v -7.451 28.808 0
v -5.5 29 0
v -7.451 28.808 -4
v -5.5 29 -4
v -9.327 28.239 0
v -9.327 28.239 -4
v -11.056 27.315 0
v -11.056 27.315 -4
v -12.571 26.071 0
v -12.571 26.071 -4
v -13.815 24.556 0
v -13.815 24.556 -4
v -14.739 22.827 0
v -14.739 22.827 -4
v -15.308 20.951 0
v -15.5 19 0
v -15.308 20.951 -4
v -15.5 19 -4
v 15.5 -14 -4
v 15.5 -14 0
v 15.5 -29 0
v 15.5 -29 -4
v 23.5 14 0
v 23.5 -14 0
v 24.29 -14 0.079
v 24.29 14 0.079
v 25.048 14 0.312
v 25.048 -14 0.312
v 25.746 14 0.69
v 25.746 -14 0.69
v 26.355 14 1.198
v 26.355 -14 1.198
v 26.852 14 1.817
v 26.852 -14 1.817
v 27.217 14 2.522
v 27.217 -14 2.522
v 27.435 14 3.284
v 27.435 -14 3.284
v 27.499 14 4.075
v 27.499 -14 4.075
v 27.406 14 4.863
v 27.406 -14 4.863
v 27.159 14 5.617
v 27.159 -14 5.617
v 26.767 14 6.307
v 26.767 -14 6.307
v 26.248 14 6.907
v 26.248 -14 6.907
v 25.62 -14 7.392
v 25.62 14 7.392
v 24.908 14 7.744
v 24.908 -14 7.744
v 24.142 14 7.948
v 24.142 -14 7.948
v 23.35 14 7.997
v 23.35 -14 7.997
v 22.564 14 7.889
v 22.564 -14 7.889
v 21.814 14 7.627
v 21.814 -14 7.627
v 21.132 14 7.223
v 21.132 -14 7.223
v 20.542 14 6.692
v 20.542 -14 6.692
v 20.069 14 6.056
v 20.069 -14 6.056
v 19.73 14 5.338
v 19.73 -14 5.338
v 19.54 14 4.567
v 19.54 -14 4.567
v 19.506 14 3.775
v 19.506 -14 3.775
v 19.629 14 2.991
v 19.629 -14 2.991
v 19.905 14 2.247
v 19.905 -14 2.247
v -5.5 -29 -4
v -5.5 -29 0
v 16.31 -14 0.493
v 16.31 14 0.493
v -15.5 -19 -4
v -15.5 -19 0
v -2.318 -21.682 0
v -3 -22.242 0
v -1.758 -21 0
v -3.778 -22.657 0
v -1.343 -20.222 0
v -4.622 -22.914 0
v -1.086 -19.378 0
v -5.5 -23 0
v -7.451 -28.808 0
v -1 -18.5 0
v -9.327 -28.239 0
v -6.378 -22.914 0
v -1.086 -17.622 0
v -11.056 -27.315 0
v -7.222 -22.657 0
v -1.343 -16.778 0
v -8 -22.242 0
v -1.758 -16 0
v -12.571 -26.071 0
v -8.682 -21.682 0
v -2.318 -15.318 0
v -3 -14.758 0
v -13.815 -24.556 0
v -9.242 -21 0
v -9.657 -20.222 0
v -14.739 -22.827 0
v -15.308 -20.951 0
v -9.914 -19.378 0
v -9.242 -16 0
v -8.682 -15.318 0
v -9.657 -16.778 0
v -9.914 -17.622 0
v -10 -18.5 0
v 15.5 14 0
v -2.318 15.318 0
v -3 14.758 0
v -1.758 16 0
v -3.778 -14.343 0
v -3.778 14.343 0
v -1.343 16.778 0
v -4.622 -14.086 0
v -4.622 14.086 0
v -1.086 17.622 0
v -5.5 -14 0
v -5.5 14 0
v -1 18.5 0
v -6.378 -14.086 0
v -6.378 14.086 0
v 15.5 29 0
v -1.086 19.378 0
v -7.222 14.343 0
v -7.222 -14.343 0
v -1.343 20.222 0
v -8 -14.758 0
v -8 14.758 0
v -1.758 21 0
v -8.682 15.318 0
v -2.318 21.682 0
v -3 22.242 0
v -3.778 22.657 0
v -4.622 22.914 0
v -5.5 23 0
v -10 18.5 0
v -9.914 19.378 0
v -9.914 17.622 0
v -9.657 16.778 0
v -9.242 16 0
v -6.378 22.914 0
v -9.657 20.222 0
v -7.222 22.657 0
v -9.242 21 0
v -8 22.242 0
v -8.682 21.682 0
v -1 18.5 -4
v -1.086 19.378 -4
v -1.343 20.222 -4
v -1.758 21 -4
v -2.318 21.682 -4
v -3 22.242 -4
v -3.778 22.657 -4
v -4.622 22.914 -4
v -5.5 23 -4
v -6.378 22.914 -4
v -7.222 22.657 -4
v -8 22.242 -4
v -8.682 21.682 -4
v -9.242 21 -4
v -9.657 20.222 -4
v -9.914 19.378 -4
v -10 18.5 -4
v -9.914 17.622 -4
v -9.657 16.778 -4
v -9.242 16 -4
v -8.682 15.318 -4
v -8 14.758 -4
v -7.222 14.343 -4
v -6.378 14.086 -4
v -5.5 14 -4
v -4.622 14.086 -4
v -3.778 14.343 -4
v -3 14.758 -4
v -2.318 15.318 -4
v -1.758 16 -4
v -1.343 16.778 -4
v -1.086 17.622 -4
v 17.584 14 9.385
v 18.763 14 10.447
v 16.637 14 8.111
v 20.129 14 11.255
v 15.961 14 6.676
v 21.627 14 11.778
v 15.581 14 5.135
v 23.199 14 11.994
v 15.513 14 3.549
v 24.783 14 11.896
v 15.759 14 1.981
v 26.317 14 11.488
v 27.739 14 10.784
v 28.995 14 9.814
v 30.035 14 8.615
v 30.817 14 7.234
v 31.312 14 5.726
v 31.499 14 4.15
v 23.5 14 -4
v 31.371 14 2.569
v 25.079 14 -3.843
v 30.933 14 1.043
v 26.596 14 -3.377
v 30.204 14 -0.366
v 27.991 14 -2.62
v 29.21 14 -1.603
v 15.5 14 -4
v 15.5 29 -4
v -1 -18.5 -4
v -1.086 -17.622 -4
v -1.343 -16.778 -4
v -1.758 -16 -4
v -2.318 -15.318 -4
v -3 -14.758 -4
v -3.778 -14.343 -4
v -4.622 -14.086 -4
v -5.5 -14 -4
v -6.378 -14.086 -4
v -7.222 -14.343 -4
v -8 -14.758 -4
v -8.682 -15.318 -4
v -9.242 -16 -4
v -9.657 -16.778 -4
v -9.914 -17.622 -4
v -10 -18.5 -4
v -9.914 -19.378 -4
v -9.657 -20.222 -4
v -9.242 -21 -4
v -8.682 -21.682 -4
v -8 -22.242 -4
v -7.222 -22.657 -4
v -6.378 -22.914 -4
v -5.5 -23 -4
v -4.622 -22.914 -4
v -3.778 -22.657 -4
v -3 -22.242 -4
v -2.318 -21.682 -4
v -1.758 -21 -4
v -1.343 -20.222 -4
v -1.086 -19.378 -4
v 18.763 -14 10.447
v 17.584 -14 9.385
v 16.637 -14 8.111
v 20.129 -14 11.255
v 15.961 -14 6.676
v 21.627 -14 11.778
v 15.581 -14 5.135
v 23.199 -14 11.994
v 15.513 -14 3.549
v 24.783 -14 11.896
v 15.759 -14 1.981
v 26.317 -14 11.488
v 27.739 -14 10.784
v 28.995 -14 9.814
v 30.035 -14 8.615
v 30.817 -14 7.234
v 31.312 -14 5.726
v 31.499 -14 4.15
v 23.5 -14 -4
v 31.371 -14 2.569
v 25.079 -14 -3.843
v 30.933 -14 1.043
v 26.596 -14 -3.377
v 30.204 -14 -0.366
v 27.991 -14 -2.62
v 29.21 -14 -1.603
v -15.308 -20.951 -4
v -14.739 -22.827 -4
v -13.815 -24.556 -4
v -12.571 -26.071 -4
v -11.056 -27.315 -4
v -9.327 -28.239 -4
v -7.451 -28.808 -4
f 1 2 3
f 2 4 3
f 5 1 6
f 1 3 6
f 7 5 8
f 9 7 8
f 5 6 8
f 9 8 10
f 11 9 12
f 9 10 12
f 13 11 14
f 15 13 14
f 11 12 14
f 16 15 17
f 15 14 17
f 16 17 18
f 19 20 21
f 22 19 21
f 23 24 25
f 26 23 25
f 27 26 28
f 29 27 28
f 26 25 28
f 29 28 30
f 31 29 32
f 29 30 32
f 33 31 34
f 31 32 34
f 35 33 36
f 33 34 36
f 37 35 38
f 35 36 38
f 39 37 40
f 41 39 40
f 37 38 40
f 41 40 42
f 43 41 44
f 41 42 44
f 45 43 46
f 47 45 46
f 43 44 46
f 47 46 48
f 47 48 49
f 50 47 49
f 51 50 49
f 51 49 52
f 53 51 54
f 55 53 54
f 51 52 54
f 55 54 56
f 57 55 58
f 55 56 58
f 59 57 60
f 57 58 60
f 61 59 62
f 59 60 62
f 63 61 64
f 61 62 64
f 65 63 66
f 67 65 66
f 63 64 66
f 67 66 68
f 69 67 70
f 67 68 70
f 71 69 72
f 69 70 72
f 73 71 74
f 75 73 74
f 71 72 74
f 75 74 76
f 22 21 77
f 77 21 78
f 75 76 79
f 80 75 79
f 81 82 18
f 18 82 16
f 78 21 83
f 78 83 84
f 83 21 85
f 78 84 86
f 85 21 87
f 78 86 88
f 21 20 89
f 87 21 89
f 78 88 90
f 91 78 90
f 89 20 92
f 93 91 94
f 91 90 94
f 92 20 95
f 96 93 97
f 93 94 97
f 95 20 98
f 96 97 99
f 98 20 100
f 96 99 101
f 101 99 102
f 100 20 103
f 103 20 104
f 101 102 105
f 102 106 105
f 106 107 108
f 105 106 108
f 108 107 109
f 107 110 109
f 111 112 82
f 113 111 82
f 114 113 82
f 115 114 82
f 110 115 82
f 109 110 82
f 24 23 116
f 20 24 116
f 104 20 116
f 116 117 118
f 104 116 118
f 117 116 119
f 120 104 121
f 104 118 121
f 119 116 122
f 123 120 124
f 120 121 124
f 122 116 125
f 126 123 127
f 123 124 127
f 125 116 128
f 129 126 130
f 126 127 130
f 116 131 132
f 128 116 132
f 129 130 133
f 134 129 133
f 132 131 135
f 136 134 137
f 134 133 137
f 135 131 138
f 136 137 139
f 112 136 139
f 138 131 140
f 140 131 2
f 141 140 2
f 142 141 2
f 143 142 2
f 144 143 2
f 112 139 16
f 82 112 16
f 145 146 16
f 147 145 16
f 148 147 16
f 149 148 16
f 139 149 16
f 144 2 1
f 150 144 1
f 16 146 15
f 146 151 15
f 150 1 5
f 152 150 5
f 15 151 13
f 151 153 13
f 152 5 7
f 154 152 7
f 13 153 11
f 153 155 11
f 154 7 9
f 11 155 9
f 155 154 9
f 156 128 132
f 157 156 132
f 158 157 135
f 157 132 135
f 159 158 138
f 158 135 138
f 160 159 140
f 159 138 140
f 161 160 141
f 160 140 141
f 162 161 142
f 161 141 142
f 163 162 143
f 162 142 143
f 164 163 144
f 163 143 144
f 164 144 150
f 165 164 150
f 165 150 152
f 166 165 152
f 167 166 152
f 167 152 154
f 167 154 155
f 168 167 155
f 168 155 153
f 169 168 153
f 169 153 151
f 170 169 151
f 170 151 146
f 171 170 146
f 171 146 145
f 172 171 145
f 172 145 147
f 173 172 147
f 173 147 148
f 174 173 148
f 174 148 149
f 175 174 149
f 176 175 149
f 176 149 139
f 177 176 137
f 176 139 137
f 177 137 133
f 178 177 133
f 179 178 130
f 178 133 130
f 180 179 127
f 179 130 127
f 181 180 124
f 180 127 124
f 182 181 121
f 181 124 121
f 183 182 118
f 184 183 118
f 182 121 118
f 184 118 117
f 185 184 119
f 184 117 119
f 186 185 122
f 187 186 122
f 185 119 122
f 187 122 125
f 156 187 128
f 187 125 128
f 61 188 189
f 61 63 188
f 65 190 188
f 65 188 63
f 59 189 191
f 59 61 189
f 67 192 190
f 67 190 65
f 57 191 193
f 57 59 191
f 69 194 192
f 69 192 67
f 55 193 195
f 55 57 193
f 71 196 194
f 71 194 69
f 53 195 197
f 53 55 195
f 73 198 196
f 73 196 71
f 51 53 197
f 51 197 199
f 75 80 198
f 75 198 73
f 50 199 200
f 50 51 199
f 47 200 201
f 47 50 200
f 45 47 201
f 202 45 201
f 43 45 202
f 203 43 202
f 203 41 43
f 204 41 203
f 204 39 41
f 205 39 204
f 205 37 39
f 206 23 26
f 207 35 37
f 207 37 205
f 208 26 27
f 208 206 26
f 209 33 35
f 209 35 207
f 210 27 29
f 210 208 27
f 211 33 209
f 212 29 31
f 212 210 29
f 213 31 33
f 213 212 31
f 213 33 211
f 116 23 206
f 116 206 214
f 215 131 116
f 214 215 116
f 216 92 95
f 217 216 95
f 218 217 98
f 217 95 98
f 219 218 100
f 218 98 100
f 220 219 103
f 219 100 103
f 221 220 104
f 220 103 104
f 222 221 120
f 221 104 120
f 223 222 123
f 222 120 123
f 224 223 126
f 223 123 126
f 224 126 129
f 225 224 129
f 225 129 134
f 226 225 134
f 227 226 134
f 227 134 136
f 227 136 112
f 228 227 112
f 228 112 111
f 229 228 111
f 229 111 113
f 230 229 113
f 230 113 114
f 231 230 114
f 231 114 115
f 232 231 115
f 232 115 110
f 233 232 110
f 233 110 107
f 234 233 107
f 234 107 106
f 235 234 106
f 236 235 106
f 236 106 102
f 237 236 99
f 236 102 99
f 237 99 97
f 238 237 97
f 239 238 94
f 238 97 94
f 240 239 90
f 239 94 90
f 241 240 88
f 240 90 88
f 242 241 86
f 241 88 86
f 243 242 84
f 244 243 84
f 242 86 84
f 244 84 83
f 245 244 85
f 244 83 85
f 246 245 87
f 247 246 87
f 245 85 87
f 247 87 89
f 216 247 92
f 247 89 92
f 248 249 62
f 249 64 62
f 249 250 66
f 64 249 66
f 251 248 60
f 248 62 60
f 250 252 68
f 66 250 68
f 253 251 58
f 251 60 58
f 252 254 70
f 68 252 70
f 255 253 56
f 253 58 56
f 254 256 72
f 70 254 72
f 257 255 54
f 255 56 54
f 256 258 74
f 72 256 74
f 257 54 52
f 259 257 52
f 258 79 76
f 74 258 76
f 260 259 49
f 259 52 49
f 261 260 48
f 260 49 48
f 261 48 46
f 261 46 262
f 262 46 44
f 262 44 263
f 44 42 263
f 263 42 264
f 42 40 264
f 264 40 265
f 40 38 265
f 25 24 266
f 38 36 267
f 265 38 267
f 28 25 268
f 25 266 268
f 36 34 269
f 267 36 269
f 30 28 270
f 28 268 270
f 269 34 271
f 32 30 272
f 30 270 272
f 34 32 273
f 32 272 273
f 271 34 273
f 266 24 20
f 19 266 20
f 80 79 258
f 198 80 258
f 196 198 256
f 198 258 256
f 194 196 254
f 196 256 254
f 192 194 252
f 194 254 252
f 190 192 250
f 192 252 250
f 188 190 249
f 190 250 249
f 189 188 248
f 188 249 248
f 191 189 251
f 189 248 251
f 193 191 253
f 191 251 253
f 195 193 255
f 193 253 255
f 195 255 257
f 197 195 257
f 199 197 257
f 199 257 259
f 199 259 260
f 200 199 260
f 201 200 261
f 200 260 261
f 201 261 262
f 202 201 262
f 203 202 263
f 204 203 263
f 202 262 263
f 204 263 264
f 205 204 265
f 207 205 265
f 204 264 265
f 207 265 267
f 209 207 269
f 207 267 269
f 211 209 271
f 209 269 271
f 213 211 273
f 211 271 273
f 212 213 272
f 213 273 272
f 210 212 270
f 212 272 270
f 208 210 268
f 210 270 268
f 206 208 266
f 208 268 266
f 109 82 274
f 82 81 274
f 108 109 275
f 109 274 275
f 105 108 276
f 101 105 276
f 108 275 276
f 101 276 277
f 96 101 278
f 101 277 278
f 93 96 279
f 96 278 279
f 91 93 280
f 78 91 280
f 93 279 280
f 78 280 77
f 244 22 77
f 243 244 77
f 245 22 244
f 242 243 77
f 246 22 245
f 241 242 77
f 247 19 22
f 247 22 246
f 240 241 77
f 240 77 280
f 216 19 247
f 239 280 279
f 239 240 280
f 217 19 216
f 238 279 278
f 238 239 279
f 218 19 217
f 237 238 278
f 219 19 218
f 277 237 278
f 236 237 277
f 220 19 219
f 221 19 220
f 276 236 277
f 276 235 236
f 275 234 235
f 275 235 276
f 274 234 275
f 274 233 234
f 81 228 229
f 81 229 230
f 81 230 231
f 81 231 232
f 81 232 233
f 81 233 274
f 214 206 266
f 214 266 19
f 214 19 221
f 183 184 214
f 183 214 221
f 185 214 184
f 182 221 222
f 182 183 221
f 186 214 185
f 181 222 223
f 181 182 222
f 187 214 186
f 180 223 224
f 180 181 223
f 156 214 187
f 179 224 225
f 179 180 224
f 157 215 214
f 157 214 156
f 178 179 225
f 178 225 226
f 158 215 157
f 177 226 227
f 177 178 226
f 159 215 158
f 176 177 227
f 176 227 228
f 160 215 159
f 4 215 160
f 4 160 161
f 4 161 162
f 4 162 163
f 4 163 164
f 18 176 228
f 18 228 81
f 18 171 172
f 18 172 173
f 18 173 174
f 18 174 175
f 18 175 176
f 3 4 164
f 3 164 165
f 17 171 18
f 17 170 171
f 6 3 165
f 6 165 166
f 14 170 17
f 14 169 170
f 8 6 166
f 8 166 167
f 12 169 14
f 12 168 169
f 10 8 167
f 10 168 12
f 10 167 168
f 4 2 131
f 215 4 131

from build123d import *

# Parameters (mm, degrees)
BASE_FLANGE1_DEPTH = 4
HEM2_START         = -14
HEM2_DEPTH         = 28
SKETCH12_R         = 4.5
CUT_EXTRUDE1_DEPTH = 10
FILLET1_R          = 10


# Read off the part's stored shape, not the designer's step: Hem2
# Sheet-metal steps are written as plain solids
with BuildPart() as part:
    # Sketch1 → Base-Flange1 (new body)
    with BuildSketch(Plane.XY):
        Polygon((15.5, 14), (23.5, 14), (23.5, -14), (15.5, -14), (15.5, -29), (-15.5, -29), (-15.5, 29), (15.5, 29), align=None)
    extrude(amount=-BASE_FLANGE1_DEPTH)

    # Hem2 outline → Hem2 (add)
    with BuildSketch(Plane(origin=(0, 0, 0), x_dir=(1, 0, 0), z_dir=(0, 1, 0)).offset(HEM2_START)):
        with BuildLine():
            Line((19.904823815, -2.246515413), (16.30964763, -0.493030826))
            ThreePointArc((16.30964763, -0.493030826), (27.739354115, -10.784384769), (23.5, 4))
            Line((23.5, 4), (23.5, 0))
            ThreePointArc((23.5, 0), (25.619677058, -7.392192385), (19.904823815, -2.246515413))
        make_face()
    extrude(amount=HEM2_DEPTH)

    # Sketch12 → Cut-Extrude1 (cut)
    with BuildSketch(Plane.XY):
        with Locations((-5.5, 18.5)):
            Circle(SKETCH12_R)
        with Locations((-5.5, -18.5)):
            Circle(SKETCH12_R)
    extrude(amount=-CUT_EXTRUDE1_DEPTH, mode=Mode.SUBTRACT)

    # Fillet1
    fillet1_edges = [part.edges().sort_by_distance(p)[0] for p in [
        (-15.5, -29, -2),
        (-15.5, 29, -2),
    ]]
    fillet(fillet1_edges, radius=FILLET1_R)


solid = part.part
